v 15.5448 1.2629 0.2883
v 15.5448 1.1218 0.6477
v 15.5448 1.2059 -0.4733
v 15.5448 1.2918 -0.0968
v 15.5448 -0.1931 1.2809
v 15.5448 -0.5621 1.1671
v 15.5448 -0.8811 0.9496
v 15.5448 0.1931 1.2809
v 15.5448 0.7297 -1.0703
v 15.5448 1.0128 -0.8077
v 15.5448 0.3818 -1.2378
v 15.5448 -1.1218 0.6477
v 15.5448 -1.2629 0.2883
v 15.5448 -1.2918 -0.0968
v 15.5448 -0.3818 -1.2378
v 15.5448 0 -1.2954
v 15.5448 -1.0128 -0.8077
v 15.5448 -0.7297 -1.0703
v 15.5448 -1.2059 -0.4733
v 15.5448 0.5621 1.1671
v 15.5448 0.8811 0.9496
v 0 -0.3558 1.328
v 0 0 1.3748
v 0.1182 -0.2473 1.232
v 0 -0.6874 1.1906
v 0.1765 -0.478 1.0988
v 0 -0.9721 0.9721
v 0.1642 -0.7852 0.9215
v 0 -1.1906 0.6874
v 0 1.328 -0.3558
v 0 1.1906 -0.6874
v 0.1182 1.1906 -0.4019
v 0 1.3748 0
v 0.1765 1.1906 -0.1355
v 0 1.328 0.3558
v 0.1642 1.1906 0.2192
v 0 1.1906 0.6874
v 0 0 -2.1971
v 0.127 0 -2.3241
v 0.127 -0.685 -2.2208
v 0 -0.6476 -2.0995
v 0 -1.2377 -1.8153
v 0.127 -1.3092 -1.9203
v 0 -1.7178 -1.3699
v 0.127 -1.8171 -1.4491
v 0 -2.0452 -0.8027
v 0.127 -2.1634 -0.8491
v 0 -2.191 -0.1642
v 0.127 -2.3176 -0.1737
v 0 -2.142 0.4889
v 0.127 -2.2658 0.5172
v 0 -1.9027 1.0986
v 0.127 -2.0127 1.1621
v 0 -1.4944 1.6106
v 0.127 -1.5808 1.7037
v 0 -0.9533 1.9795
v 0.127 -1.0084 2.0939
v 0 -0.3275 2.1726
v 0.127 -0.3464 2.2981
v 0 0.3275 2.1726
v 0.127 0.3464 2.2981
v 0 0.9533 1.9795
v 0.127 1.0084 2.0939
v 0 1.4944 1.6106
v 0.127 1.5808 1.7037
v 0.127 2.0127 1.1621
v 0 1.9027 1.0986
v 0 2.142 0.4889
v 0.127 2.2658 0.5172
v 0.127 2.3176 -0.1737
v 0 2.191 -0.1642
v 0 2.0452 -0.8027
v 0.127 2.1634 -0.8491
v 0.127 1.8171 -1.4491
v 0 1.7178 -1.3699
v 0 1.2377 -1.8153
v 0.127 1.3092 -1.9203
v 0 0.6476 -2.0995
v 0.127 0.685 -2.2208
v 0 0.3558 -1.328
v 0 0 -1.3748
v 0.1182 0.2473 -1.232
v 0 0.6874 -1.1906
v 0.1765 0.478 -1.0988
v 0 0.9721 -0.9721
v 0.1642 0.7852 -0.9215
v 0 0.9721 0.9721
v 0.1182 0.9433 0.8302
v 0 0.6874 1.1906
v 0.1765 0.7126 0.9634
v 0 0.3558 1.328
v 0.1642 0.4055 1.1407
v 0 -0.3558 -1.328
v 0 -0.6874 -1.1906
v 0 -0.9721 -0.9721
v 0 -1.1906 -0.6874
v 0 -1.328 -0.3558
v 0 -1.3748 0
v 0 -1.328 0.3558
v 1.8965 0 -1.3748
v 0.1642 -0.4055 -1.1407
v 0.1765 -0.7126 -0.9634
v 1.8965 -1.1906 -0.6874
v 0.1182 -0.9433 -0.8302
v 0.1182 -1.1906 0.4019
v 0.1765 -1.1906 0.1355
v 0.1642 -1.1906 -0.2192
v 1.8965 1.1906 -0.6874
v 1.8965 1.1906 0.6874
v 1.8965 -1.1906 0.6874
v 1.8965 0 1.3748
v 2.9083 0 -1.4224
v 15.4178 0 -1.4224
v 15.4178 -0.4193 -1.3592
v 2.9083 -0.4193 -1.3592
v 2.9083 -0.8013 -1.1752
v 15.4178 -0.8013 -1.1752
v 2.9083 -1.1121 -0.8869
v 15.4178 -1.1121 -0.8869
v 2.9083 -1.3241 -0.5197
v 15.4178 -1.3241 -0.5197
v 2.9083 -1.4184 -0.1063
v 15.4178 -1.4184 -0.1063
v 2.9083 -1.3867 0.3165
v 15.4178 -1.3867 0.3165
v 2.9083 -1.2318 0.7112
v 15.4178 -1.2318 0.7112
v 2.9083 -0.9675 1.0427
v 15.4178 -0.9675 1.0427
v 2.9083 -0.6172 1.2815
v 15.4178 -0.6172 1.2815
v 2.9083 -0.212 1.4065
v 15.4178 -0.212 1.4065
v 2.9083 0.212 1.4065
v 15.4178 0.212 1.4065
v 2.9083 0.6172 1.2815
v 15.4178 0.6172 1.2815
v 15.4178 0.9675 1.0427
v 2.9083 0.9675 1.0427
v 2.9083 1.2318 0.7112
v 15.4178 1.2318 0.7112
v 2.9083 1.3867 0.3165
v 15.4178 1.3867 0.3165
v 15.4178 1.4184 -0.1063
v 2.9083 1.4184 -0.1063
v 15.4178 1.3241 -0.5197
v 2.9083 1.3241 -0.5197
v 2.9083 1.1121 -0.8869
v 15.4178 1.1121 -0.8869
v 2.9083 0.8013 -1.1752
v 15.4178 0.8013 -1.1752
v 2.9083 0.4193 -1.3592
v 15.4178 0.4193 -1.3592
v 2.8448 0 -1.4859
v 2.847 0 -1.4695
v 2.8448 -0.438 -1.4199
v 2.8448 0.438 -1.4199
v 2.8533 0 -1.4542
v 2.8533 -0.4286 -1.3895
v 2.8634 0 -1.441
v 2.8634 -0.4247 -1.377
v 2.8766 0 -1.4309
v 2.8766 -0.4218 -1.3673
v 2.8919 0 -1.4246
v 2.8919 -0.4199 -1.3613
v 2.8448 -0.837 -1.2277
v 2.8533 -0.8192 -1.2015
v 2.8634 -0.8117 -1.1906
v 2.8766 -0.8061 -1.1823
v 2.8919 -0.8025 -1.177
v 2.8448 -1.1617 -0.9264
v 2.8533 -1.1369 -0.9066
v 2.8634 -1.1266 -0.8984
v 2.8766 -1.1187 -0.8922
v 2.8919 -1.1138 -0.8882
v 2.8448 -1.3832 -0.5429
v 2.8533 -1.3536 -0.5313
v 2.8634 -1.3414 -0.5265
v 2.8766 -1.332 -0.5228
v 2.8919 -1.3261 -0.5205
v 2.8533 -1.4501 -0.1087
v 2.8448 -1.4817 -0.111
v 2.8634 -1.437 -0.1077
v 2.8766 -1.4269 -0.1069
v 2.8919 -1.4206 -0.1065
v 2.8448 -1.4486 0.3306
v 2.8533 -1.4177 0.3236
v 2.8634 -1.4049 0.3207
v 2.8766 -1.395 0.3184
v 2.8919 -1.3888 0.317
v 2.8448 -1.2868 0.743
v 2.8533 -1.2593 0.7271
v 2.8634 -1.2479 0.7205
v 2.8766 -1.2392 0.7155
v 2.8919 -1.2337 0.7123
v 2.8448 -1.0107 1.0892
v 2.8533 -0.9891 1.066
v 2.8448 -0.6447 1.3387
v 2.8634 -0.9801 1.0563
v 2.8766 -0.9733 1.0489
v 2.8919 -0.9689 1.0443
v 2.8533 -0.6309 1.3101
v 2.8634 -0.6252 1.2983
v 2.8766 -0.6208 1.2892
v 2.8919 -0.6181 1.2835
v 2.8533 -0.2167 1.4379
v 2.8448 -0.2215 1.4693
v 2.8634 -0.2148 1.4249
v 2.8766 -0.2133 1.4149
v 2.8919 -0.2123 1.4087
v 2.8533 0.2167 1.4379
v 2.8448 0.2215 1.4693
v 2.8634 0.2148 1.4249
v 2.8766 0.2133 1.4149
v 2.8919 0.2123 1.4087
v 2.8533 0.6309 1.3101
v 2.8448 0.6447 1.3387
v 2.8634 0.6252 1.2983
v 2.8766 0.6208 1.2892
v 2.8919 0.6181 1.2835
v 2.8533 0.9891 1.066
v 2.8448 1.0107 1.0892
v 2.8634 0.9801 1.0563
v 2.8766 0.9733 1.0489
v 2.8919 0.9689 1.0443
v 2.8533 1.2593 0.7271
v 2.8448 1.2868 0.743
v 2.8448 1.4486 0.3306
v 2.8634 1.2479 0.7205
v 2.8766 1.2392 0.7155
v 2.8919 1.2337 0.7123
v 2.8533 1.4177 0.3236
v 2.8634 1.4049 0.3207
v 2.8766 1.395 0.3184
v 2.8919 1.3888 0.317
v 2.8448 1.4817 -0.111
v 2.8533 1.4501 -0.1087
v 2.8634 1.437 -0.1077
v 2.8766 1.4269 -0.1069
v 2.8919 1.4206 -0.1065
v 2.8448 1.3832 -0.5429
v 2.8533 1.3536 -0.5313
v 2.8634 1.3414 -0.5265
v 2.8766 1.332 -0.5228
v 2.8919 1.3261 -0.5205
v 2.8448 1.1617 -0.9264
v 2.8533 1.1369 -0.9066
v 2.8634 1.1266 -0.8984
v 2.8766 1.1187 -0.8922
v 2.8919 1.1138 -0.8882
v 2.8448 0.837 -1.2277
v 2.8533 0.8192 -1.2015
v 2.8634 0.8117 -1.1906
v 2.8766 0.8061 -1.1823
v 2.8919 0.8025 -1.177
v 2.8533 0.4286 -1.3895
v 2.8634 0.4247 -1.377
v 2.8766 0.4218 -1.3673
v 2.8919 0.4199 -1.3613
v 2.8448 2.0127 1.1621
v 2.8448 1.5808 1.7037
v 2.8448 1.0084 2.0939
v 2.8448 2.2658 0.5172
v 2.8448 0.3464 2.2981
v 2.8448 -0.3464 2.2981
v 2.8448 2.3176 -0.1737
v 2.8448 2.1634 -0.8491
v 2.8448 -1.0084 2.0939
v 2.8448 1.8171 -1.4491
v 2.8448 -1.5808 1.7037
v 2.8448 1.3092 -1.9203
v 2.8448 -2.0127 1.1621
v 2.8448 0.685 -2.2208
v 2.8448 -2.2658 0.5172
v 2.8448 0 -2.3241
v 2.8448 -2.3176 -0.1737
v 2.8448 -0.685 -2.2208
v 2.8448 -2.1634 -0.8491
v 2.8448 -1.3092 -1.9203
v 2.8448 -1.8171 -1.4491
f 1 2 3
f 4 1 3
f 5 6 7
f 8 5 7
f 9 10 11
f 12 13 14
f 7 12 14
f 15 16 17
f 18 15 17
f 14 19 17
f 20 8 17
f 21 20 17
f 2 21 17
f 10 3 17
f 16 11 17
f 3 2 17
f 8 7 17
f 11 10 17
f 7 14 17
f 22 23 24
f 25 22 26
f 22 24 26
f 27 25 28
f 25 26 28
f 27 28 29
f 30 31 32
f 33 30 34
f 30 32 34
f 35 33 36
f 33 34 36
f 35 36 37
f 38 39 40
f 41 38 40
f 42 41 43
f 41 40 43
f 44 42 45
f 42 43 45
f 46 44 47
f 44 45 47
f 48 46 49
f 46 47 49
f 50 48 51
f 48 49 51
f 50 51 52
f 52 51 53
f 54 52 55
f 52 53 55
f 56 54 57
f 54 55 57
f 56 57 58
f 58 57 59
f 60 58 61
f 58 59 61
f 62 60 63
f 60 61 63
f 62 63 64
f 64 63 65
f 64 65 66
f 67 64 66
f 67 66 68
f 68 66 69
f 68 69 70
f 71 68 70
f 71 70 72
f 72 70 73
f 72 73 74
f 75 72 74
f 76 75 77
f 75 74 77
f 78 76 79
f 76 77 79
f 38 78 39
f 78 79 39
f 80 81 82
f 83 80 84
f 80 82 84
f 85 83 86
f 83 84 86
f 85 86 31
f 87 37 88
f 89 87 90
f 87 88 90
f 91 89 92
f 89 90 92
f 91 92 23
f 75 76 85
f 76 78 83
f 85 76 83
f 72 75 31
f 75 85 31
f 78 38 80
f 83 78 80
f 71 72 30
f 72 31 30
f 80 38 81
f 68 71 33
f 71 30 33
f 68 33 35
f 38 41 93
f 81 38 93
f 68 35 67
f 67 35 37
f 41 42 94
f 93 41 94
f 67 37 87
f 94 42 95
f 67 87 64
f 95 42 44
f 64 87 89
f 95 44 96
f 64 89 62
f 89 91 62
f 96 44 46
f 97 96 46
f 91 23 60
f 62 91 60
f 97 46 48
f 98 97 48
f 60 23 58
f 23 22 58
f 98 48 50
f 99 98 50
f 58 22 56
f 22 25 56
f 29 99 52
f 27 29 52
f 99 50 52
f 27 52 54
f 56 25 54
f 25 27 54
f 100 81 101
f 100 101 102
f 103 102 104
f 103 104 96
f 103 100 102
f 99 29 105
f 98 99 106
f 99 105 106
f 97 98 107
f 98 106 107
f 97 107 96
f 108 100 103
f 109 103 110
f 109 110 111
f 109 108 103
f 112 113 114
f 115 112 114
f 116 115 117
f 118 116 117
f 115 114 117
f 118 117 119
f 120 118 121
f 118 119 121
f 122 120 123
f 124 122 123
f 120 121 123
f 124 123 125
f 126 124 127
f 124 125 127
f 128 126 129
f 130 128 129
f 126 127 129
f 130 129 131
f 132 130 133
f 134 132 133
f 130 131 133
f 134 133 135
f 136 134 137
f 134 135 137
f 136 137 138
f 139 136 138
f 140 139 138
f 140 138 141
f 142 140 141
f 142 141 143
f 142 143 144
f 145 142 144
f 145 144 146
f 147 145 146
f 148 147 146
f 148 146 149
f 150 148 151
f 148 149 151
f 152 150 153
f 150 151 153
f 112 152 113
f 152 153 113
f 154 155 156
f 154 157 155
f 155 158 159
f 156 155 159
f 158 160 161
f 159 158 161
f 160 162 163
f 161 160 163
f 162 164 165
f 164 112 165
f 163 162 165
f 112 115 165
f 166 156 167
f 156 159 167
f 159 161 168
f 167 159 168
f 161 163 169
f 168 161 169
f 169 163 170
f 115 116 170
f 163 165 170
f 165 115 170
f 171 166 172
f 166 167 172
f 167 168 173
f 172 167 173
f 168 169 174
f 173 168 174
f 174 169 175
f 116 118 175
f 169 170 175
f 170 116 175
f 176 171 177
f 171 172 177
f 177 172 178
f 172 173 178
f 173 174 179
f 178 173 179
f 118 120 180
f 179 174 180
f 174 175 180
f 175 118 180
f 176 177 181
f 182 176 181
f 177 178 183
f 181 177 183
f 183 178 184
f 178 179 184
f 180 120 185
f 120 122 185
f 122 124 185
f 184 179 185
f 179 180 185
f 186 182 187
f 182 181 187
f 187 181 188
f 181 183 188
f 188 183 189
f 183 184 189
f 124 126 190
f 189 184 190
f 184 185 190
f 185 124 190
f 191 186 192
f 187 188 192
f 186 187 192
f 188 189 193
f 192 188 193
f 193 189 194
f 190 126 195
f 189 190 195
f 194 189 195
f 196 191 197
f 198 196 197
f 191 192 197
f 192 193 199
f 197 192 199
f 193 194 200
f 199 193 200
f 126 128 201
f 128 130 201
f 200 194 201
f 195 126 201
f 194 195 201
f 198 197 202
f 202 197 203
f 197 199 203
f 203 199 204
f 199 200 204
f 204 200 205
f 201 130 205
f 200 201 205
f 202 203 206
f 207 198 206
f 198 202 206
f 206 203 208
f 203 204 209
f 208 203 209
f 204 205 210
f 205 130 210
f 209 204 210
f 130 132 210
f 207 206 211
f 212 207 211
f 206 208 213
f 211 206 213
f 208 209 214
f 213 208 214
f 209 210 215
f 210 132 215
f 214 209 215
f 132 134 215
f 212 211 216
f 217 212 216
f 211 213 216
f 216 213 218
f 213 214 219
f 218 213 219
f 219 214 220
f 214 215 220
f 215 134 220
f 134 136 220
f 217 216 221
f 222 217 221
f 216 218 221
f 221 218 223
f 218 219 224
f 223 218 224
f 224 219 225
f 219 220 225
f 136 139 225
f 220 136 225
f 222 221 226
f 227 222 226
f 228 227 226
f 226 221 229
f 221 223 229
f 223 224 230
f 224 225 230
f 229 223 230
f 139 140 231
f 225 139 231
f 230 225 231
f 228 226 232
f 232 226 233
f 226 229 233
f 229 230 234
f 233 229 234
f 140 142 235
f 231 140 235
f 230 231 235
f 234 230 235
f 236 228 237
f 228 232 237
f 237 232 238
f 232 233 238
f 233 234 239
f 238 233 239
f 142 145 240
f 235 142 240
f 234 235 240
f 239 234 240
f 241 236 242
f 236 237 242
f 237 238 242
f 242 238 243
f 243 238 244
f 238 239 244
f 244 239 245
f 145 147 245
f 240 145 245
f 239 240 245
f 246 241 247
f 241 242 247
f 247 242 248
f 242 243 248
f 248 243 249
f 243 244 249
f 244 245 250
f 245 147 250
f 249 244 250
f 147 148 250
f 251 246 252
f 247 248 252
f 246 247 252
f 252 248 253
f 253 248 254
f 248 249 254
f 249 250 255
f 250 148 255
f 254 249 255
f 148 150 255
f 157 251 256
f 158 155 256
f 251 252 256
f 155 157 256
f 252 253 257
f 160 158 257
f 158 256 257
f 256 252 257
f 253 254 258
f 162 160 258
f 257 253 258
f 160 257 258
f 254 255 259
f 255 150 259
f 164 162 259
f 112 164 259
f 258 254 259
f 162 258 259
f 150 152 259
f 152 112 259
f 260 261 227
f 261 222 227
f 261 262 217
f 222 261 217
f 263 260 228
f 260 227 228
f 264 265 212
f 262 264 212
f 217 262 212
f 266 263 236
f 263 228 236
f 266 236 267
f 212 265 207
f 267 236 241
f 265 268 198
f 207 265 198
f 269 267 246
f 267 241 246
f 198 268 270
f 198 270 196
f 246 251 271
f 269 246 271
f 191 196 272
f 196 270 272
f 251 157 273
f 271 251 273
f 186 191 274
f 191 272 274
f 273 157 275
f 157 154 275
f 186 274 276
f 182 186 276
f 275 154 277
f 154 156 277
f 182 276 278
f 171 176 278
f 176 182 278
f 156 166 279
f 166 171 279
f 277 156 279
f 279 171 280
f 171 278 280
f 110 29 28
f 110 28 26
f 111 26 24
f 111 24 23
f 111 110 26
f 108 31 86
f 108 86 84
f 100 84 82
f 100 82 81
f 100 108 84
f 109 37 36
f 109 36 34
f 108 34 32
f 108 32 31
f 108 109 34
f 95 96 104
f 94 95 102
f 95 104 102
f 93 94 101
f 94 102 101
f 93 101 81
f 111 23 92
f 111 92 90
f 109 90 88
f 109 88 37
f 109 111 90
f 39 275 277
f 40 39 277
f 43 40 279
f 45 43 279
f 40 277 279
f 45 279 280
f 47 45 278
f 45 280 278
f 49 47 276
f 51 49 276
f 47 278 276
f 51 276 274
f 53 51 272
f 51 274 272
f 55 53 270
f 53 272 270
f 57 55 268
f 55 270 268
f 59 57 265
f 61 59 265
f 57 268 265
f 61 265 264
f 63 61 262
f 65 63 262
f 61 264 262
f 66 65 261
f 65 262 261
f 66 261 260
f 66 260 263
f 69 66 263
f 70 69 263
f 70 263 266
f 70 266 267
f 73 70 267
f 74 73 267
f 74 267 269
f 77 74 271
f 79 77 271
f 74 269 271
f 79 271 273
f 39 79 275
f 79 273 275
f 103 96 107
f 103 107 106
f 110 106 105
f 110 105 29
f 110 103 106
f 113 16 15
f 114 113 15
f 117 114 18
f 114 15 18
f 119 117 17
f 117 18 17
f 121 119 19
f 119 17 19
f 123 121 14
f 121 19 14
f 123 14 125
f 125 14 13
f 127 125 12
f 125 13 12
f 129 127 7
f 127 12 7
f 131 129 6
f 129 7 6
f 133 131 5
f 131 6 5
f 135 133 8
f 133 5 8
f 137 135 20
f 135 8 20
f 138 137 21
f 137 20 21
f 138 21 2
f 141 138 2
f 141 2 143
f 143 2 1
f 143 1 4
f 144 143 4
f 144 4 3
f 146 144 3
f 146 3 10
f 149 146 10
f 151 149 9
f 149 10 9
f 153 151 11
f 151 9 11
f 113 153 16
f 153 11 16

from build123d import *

# Parameters (mm, degrees)
HEX_START     = -1.896533
HEX_2_DEPTH   = 1.896533
CHAMFER1_SIZE = 0.127
FILLET1_R     = 0.0635


with BuildPart() as part:
    # Sketch1 → Body (revolve)
    with BuildSketch(Plane(origin=(0, 0, 0), x_dir=(1, 0, 0), z_dir=(0, 1, 0))):
        Polygon((0, 0), (0, 2.3241), (2.8448, 2.3241), (2.8448, 1.4224), (15.5448, 1.4224), (15.5448, 0), align=None)
    revolve(axis=Axis((15.5448, 0, 0), (-1, 0, 0)))

    # Sketch2 → Hex 2 (cut)
    with BuildSketch(Plane.ZY.offset(HEX_START)):
        Polygon((-1.374815329, 0), (-0.687407664, -1.190625), (0.687407664, -1.190625), (1.374815329, 0), (0.687407664, 1.190625), (-0.687407664, 1.190625), align=None)
    extrude(amount=HEX_2_DEPTH, mode=Mode.SUBTRACT)

    # Chamfer1
    chamfer1_edges = [part.edges().sort_by_distance(p)[0] for p in [
        (0, 0, 2.3241),
        (15.5448, 0, 1.4224),
    ]]
    chamfer(chamfer1_edges, length=CHAMFER1_SIZE)

    # Fillet1
    fillet1_edges = [part.edges().sort_by_distance(p)[0] for p in [
        (2.8448, 0, 1.4224),
    ]]
    fillet(fillet1_edges, radius=FILLET1_R)

    # Hex Chamfer cone 1 section (through the dimple's axis) → Hex Chamfer (revolve, cut)
    with BuildSketch(Plane.ZX):
        Polygon((0, 0), (1.374815329, 0), (0, 1.374815329), align=None)
    revolve(axis=Axis((0, 0, 0), (1, 0, 0)), mode=Mode.SUBTRACT)


solid = part.part
